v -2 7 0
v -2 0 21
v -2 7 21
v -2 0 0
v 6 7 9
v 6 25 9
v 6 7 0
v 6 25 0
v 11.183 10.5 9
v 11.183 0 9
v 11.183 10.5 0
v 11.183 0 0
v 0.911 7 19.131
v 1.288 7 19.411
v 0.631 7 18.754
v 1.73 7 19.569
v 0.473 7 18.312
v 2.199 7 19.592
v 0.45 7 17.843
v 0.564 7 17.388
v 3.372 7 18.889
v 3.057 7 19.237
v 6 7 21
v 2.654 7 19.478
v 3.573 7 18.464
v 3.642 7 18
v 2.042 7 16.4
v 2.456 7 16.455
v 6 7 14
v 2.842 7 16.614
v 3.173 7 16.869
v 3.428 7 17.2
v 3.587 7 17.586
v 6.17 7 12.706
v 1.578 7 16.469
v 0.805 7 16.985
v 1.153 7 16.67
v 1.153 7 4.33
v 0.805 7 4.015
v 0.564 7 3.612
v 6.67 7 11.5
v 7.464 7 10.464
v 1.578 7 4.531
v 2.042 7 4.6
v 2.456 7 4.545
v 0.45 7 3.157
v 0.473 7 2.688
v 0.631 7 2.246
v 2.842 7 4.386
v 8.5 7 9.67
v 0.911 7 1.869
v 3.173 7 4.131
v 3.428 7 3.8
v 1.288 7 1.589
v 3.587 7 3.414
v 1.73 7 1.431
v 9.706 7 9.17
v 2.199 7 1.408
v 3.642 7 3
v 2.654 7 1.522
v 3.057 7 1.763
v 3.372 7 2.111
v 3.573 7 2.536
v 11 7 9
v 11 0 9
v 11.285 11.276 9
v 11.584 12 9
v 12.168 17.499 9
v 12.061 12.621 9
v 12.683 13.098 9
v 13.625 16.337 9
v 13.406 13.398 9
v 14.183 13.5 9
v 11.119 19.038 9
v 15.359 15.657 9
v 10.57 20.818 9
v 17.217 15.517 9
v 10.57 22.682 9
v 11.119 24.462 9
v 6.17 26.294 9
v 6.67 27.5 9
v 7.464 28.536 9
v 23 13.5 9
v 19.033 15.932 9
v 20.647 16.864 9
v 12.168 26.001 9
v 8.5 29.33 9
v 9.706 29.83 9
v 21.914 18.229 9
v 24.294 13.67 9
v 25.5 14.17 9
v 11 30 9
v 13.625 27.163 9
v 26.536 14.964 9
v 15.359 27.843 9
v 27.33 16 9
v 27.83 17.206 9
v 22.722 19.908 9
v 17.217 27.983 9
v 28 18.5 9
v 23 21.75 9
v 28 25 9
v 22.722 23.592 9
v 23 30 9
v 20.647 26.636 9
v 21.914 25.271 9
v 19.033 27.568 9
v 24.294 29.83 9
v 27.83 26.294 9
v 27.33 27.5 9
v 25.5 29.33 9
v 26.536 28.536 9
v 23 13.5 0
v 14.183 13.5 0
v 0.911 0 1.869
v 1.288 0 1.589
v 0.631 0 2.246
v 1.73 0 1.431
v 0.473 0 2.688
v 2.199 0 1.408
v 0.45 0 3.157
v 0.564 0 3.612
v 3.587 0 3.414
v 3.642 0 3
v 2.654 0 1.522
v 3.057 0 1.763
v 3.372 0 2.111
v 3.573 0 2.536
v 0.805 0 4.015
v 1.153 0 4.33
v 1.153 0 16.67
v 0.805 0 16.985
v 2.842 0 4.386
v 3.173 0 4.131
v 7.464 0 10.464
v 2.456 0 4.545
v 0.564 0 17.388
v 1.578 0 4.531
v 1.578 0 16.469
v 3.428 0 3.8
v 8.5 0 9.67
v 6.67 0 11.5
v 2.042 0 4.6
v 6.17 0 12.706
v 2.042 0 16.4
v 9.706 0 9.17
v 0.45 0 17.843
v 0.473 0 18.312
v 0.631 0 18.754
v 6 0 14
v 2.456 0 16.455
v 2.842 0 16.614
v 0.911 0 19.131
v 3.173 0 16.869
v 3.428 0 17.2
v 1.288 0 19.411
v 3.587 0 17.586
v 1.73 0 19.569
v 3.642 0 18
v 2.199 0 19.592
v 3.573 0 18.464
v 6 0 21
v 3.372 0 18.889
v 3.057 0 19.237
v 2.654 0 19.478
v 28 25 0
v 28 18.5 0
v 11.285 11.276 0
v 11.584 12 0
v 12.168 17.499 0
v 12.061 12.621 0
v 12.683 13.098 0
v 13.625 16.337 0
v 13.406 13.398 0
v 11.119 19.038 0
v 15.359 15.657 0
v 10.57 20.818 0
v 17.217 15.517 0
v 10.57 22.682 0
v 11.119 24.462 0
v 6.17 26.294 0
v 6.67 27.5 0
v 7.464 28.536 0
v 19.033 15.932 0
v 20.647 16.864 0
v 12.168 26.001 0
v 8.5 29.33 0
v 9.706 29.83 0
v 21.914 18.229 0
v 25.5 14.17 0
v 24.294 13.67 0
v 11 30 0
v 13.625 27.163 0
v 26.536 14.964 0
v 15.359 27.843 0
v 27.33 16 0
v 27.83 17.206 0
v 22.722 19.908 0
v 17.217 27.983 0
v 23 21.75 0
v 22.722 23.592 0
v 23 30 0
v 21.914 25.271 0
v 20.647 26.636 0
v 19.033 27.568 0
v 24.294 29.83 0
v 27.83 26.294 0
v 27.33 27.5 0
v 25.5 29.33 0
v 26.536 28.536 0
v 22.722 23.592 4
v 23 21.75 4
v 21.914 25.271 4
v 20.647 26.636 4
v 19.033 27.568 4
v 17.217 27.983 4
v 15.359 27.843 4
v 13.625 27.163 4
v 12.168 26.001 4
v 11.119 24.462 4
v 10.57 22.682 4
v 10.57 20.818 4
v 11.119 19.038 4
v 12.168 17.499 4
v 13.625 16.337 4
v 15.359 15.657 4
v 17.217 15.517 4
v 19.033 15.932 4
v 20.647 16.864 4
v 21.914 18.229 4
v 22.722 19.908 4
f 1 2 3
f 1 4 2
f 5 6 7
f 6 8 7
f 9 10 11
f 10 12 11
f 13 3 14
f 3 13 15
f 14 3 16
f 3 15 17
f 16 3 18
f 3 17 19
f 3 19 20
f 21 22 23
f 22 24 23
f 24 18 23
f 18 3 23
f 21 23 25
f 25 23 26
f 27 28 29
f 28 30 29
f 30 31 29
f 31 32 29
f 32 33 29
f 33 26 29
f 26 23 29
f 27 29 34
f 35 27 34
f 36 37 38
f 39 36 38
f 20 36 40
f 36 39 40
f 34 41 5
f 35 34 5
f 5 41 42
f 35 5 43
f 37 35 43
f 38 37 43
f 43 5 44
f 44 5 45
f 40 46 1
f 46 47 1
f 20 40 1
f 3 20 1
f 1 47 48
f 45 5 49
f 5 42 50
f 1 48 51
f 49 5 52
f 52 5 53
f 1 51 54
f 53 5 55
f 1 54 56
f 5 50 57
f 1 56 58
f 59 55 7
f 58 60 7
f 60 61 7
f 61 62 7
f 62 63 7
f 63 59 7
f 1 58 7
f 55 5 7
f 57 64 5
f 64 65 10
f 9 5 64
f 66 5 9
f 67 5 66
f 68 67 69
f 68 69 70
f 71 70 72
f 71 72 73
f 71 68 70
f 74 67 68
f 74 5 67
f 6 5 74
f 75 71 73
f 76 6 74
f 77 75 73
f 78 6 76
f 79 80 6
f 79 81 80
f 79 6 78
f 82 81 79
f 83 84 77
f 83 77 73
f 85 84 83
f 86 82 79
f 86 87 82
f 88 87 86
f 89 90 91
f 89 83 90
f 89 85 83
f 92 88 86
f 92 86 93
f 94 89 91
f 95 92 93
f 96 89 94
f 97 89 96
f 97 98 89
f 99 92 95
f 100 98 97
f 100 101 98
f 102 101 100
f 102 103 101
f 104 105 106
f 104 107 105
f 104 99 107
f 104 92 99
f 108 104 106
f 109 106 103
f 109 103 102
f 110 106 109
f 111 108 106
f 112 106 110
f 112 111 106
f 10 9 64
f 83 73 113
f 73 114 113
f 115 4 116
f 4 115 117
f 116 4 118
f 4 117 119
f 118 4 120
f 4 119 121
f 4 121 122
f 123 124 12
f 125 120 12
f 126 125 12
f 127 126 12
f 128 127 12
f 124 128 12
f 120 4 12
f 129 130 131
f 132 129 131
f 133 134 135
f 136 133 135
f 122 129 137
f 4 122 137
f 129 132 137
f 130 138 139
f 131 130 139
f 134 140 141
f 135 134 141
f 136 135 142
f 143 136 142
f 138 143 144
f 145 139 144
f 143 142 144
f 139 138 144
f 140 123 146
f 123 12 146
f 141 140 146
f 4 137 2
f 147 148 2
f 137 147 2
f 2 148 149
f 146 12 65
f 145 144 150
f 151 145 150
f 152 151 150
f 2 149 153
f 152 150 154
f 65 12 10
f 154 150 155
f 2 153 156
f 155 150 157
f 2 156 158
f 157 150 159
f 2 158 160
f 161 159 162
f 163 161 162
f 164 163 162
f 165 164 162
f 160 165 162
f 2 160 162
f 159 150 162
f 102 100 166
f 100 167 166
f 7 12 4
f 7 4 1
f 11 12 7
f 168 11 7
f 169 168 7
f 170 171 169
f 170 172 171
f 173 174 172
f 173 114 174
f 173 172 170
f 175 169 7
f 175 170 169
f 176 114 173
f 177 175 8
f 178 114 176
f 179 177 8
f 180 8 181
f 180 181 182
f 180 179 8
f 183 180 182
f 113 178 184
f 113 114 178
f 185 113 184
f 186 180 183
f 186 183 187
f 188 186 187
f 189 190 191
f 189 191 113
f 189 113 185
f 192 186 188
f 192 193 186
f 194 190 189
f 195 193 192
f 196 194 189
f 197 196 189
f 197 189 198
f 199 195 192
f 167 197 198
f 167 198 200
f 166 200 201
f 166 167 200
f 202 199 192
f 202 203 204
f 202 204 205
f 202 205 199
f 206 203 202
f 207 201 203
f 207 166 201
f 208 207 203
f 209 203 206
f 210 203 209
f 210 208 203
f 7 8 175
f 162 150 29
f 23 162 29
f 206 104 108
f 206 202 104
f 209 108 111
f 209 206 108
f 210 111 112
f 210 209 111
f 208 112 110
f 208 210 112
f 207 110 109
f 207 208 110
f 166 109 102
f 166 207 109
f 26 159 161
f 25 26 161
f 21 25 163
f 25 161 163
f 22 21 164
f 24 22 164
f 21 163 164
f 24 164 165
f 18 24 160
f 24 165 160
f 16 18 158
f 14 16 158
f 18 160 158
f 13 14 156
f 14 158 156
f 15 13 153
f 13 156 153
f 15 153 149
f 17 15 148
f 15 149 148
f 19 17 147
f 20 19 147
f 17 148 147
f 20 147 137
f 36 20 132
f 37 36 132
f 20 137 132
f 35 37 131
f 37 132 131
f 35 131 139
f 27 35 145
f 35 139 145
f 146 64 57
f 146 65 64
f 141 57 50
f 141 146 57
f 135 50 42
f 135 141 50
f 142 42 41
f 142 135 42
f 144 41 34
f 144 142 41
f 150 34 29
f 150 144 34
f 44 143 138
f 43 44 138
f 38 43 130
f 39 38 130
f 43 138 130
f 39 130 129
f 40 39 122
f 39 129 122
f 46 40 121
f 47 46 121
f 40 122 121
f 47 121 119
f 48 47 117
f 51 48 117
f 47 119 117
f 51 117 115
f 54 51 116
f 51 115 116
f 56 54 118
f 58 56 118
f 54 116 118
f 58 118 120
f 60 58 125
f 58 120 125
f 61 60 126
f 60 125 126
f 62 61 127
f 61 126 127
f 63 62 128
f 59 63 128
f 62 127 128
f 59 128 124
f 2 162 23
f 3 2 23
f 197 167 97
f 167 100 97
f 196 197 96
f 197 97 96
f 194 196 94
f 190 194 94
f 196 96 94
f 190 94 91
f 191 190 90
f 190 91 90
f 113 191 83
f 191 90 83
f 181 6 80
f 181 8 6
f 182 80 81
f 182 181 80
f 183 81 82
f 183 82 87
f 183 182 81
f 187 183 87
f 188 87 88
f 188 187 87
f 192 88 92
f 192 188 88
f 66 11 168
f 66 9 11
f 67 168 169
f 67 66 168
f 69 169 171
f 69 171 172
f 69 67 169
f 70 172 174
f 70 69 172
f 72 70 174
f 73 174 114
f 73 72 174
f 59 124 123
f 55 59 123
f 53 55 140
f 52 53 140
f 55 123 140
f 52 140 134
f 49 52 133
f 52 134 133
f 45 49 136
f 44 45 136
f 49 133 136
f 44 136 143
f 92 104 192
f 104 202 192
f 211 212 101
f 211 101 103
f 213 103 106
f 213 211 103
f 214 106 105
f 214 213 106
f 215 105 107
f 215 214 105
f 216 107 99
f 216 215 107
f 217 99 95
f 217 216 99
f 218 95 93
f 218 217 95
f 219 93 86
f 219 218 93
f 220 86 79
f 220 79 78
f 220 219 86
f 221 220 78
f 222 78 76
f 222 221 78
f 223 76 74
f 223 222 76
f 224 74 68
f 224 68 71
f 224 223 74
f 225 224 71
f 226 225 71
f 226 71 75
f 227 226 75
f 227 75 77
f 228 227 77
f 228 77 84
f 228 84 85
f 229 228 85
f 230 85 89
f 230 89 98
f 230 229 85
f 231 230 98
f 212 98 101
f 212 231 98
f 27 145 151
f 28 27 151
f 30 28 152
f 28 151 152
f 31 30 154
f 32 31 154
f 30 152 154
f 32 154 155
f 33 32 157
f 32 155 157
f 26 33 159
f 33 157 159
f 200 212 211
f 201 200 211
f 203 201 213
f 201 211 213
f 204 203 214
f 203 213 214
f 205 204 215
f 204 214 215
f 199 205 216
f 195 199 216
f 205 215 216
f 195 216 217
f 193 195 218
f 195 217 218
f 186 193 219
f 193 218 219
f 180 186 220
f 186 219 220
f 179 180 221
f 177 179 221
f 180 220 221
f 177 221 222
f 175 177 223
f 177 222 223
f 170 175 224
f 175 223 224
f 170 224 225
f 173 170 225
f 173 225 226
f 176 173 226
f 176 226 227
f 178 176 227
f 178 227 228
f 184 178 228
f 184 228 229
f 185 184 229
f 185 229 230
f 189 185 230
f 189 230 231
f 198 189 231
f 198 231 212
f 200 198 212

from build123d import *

# Parameters (mm, degrees)
F0_W      = 28
F0_H      = 30
F1_DEPTH  = 4
F2_R      = 6.25
F2_W      = 6
F2_H      = 23
F2_W_2    = 16.817460835
F2_H_2    = 13.5
F3_DEPTH  = 25
F4_W      = 6
F4_H      = 7
F4_R      = 6.25
F5_DEPTH  = 5
F6_DEPTH  = 17
F8_DEPTH  = 25
F9_R      = 5
F10_R     = 3
F11_R     = 5
F12_DEPTH = 2


with BuildPart() as f1:
    # F0 (on Top) → F1 (new body)
    with BuildSketch(Plane.XY):
        with Locations((14, 15)):
            Rectangle(F0_W, F0_H)
    extrude(amount=F1_DEPTH)

    # F2 (on face) → F3 (cut)
    with BuildSketch(Plane.XY.offset(4)):
        with Locations((16.75, 21.75)):
            Circle(F2_R)
        with Locations((3, 18.5)):
            Rectangle(F2_W, F2_H)
        with Locations((19.5912695825, 6.75)):
            Rectangle(F2_W_2, F2_H_2)
    extrude(amount=-F3_DEPTH, mode=Mode.SUBTRACT)

    # F4 (on face) → F5 (join)
    with BuildSketch(Plane.XY.offset(4)):
        with Locations((3, 3.5)):
            Rectangle(F4_W, F4_H)
        Polygon((6, 30), (6, 7), (6, 0), (11.182539165, 0), (11.182539165, 13.5), (28, 13.5), (28, 30), align=None)
        with Locations((16.75, 21.75)):
            Circle(F4_R, mode=Mode.SUBTRACT)
    extrude(amount=F5_DEPTH)

    # F4 (on face) → F6 (join)
    with BuildSketch(Plane.XY.offset(4)):
        with Locations((3, 3.5)):
            Rectangle(F4_W, F4_H)
    extrude(amount=F6_DEPTH)

    # F7 (on face) → F8 (cut)
    with BuildSketch(Plane.XZ):
        with BuildLine():
            ThreePointArc((3.6420098484, 3), (3.1733806983, 4.1313708499), (2.0420098484, 4.6))
            ThreePointArc((2.0420098484, 4.6), (0.9106389985, 1.8686291501), (3.6420098484, 3))
        make_face()
        with BuildLine():
            ThreePointArc((3.6420098484, 18), (0.9106389985, 19.1313708499), (2.0420098484, 16.4))
            ThreePointArc((2.0420098484, 16.4), (3.1733806983, 16.8686291501), (3.6420098484, 18))
        make_face()
    extrude(amount=-F8_DEPTH, mode=Mode.SUBTRACT)

    # F9
    f9_edges = [f1.edges().sort_by_distance(p)[0] for p in [
        (28, 13.5, 4.5),
        (28, 30, 4.5),
        (6, 30, 4.5),
    ]]
    fillet(f9_edges, radius=F9_R)

    # F10
    f10_edges = [f1.edges().sort_by_distance(p)[0] for p in [
        (11.182539, 13.5, 4.5),
    ]]
    fillet(f10_edges, radius=F10_R)

    # F11
    f11_edges = [f1.edges().sort_by_distance(p)[0] for p in [
        (6, 3.5, 9),
    ]]
    fillet(f11_edges, radius=F11_R)

    # F12 (add): a face of the model
    f12_faces = [f1.faces().sort_by_distance(p)[0] for p in [
        (0, 3.5, 10.5),
    ]]
    extrude(f12_faces, amount=F12_DEPTH)


solid = f1.part
